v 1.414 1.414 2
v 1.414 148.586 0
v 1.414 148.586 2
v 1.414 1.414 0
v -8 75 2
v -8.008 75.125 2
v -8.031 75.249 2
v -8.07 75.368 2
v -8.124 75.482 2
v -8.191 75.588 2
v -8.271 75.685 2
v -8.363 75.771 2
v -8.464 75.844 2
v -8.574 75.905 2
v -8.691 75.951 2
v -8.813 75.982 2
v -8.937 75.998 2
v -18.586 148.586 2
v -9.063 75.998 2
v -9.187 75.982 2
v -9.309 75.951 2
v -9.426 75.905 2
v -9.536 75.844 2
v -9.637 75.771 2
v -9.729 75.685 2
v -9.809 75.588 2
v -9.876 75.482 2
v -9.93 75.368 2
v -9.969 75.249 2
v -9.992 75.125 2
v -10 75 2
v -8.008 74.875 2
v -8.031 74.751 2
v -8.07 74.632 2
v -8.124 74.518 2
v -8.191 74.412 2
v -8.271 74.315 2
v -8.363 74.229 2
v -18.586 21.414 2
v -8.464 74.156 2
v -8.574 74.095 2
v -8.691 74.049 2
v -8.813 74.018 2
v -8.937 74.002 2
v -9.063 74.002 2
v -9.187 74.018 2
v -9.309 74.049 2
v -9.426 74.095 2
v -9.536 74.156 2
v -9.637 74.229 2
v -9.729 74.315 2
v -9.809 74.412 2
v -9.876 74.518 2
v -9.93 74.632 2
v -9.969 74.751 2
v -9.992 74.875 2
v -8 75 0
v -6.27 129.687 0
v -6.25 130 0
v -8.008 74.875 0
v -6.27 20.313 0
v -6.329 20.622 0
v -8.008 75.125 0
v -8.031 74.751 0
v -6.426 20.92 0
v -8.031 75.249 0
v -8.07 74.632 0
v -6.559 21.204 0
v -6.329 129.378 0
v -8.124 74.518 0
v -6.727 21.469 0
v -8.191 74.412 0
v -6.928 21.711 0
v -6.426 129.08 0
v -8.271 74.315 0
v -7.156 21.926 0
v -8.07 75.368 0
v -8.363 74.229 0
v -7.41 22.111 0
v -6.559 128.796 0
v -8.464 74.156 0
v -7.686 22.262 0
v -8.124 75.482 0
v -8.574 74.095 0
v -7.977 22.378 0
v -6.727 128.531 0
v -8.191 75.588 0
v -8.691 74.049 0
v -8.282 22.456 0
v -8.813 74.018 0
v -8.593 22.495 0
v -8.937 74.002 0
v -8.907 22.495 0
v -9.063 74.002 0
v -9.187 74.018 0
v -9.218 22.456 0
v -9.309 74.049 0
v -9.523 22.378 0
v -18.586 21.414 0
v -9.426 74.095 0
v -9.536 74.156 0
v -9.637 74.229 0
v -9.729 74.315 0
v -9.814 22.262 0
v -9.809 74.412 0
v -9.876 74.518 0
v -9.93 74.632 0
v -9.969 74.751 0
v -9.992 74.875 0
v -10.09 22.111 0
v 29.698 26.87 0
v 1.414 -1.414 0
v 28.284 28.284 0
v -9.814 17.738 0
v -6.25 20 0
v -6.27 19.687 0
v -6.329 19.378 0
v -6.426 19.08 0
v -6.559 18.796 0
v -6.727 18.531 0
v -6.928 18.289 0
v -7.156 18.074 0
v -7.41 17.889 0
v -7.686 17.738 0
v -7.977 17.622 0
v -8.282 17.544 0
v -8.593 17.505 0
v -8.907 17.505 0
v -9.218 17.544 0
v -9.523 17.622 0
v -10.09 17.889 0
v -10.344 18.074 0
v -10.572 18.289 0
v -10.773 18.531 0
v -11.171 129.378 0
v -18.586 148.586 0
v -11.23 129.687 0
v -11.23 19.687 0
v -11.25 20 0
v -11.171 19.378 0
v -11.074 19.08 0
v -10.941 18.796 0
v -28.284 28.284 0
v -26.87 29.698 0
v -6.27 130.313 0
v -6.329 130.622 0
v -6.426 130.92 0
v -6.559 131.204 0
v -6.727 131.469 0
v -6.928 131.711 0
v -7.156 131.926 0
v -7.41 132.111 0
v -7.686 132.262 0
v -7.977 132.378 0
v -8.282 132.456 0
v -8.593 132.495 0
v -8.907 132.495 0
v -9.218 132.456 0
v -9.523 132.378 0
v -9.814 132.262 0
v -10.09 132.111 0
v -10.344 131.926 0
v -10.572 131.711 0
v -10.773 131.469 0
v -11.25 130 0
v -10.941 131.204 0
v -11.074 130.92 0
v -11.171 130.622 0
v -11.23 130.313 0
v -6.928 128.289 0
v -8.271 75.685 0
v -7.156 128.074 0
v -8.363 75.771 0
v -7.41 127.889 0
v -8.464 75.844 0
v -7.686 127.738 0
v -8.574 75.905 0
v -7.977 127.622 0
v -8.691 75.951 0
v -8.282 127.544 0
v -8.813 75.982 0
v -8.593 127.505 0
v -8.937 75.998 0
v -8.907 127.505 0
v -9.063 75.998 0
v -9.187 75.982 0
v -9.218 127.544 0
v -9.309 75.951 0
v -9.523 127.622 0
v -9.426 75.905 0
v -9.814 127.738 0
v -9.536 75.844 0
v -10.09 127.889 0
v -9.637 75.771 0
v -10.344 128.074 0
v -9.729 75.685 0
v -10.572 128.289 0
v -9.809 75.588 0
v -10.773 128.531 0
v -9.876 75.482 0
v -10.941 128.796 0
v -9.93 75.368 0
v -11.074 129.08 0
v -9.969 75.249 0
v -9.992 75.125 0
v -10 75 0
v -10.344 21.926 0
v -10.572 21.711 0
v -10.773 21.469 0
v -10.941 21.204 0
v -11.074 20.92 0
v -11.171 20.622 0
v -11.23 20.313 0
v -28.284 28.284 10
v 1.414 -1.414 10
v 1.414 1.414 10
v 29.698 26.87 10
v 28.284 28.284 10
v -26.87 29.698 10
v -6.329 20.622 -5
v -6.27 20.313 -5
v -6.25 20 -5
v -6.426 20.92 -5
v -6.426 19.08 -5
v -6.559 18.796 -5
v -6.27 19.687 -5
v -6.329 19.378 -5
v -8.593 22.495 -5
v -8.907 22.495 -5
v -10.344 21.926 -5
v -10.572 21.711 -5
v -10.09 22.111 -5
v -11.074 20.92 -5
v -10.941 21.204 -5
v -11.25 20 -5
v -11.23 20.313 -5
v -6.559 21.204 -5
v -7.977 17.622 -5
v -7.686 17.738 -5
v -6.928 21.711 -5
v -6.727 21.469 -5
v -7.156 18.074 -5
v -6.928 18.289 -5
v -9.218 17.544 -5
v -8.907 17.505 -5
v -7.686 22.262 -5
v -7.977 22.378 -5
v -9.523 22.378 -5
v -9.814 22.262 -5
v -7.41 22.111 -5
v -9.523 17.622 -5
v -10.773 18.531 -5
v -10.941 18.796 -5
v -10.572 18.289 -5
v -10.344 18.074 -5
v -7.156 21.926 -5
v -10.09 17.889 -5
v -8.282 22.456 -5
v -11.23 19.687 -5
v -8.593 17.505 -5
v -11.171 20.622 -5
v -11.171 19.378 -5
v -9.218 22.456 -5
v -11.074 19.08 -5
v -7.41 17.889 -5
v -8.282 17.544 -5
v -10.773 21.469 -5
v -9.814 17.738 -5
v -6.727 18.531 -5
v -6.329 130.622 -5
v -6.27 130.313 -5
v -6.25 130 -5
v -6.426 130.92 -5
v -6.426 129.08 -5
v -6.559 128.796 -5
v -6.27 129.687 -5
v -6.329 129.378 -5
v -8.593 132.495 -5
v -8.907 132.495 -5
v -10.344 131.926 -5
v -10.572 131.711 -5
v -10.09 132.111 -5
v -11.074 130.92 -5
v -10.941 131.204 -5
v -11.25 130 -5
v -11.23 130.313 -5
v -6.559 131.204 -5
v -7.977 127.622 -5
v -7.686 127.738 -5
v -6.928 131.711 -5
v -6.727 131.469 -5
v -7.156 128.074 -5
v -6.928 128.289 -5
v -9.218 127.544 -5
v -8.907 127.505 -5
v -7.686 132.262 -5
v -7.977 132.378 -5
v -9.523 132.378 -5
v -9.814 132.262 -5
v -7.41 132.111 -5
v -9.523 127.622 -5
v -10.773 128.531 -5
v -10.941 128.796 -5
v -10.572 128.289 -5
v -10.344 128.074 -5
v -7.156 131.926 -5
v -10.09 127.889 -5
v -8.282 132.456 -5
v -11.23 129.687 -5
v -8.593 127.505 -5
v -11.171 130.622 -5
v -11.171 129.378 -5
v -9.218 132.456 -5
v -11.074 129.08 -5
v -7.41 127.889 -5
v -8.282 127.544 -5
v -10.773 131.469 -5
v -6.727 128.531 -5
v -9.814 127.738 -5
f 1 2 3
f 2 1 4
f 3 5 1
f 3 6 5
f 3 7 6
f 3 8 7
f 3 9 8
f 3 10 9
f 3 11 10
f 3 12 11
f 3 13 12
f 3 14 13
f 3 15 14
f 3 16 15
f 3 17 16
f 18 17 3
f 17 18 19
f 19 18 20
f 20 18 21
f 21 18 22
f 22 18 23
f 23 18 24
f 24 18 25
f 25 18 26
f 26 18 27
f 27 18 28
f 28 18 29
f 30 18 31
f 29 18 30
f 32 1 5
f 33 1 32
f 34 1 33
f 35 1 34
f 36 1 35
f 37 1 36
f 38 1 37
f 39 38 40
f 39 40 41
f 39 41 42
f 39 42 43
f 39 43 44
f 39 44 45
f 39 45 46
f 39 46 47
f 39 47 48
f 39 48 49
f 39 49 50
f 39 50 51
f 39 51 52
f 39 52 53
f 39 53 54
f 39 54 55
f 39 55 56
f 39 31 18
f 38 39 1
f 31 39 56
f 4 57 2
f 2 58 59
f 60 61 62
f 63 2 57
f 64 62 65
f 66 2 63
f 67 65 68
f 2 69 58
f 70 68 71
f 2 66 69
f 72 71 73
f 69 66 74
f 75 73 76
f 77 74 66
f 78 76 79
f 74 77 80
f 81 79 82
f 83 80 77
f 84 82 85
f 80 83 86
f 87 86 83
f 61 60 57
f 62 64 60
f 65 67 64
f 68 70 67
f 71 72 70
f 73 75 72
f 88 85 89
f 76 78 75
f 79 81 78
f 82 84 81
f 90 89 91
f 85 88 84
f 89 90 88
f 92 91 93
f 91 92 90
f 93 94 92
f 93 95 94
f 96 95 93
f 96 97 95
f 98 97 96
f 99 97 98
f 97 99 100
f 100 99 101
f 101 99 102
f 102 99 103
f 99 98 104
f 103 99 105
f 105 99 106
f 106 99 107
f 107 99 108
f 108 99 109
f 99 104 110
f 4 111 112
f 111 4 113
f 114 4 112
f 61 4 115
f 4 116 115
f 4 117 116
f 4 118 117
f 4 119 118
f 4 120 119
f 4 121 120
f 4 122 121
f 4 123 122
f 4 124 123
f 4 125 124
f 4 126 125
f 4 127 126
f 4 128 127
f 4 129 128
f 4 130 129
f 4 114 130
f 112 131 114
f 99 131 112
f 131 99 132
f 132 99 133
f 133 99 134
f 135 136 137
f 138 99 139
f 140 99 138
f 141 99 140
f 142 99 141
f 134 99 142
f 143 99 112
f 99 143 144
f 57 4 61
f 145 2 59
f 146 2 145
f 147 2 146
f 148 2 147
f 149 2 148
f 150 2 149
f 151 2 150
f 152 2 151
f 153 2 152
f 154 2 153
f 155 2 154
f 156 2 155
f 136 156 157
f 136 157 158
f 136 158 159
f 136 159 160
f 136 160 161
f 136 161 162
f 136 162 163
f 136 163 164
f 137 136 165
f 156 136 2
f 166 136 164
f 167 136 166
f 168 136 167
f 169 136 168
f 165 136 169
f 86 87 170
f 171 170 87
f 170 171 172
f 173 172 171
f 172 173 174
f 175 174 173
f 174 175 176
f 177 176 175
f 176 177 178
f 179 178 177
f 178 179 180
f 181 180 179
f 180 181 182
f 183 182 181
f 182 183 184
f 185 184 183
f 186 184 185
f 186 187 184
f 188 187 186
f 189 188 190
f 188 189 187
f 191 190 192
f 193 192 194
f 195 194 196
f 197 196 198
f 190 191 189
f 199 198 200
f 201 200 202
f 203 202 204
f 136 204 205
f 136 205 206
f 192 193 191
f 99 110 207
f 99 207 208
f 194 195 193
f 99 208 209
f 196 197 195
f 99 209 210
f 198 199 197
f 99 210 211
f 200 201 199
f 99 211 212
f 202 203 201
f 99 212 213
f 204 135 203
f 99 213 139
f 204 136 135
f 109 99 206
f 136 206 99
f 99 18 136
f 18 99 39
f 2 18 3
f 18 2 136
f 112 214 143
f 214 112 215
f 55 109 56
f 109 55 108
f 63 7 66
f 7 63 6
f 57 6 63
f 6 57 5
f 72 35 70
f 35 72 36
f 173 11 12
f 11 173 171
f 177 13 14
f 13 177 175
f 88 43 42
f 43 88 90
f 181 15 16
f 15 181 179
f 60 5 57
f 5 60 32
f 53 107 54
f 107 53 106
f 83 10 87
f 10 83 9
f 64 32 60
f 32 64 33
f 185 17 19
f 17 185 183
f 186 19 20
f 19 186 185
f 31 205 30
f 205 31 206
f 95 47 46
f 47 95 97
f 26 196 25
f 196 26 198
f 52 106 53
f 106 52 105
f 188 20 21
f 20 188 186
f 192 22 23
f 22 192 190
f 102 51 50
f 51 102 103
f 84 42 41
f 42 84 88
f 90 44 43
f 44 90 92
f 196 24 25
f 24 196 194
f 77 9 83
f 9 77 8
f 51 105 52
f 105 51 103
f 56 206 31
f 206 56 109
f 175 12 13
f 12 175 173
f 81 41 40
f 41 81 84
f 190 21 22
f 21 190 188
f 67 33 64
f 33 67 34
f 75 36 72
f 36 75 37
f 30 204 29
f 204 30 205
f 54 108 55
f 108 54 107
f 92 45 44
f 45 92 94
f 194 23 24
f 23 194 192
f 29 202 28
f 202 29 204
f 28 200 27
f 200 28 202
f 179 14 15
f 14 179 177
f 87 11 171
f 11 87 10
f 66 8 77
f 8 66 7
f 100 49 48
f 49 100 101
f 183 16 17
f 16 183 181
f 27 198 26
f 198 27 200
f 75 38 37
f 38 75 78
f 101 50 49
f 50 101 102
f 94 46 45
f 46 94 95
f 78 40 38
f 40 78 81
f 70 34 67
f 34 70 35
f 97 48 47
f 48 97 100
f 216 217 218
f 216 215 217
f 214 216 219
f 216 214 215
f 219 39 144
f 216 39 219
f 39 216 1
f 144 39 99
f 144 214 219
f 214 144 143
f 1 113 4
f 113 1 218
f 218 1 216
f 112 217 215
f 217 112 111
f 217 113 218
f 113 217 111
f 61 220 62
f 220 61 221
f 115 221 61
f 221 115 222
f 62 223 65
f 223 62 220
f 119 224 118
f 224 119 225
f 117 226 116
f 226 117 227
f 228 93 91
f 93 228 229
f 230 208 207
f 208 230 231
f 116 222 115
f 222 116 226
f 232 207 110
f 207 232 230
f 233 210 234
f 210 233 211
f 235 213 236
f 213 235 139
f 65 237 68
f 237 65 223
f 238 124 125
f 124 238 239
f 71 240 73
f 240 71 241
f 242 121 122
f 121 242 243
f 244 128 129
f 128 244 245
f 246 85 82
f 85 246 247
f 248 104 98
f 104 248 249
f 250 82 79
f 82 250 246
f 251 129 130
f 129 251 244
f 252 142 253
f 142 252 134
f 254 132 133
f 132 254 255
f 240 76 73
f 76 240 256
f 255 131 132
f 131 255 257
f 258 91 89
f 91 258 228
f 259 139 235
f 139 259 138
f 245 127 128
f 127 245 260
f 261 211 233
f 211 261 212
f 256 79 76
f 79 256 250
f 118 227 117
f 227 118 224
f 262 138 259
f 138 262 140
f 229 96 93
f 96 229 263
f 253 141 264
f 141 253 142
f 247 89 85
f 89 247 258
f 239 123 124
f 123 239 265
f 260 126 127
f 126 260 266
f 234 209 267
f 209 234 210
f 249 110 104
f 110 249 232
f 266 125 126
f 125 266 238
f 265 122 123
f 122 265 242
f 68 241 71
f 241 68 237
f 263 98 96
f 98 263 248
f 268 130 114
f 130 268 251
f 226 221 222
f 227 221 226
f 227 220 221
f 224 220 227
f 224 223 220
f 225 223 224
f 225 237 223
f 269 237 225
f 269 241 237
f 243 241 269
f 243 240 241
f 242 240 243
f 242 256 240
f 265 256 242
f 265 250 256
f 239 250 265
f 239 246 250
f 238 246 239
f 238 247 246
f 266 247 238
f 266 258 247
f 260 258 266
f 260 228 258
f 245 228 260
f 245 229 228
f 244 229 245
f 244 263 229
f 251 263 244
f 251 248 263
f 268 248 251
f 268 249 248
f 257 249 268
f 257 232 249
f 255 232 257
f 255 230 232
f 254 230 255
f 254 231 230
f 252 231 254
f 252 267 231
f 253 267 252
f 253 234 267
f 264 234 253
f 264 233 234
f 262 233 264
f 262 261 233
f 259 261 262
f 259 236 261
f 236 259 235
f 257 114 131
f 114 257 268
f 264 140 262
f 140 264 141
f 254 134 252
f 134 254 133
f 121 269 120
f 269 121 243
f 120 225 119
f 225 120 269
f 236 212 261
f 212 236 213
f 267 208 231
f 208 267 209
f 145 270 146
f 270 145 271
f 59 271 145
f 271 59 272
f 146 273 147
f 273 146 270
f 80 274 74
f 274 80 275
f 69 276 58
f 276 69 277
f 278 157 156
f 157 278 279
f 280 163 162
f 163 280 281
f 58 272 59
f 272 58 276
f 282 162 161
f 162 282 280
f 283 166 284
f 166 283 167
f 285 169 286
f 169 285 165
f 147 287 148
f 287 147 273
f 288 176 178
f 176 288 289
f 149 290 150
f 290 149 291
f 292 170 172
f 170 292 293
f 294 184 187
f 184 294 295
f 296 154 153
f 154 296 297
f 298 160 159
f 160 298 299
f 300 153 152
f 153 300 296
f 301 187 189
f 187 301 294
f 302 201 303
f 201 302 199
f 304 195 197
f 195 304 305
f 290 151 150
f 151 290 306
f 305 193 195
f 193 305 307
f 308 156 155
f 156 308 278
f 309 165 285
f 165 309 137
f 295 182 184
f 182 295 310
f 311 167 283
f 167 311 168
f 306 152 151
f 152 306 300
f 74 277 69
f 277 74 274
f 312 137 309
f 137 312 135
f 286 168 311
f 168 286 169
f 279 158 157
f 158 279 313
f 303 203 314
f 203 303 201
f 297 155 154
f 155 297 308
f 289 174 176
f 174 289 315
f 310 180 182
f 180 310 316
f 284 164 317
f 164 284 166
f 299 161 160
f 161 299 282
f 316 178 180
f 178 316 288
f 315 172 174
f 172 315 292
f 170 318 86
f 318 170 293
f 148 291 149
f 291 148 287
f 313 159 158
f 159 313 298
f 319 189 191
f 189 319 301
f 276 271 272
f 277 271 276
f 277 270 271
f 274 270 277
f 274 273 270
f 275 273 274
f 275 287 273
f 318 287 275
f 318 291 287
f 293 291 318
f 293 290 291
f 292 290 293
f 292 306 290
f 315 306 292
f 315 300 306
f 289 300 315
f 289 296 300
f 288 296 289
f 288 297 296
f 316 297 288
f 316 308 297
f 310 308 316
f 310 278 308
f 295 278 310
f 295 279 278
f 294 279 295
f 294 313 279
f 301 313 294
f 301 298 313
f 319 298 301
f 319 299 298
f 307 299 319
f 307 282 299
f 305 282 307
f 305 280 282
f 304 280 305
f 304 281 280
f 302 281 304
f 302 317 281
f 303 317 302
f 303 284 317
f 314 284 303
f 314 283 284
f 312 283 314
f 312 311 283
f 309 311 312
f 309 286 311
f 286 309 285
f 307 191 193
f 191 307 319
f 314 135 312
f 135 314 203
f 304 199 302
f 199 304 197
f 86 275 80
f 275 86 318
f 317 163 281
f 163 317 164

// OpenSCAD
//length of the ruler in mm
length=150; //[51:500]

//width of the ruler in mm
width=20; //[5:50]

//thickness
height=2; //[2:10]

//depth of the edge for cirular measurement
edgedepth=8; //[5:50]

//height of the pins
cylinderheight=5; //[5:20]

//diameter of the marker hole
holediameter=2; //[1:4]


cylinderdiameter=4+1;
cylinderradius=cylinderdiameter/2;



rotate(a=[0,0,45]){
    cube([height,(width*2),edgedepth+height]);
};

rotate(a=[0,0,-45]){
cube([height,width*2,edgedepth+height]);
};

xoffset=sqrt((width*width)/2)-sqrt(height);
yoffset=sqrt((width*width)/2)+sqrt((width*width)/2);


difference(){
	difference(){
		translate(v=[-(width-sqrt(height)),-sqrt(height),0]){
		cube([width,length,height]);
		}

		translate(v=[0,-yoffset,-1]){
			rotate(a=[0,0,45]){
				cube([width,(width*width)/2,height+2]);
			}
		}
	}
	// hole
	translate(v=[-(width/2)+(holediameter/2),(length/2),(height/2)]){
		cylinder(r=(holediameter/2), h=height, center=true, $fn=50);
	}
};
translate(v=[-(width/2)+cylinderradius/2,(width),-(cylinderheight/2)]){
    cylinder(r=cylinderradius, h=cylinderheight, center=true, $fn=50);
};

translate(v=[-(width/2)+cylinderradius/2,(length-width),-(cylinderheight/2)]){
    cylinder(r=cylinderradius, h=cylinderheight, center=true, $fn=50);
};
